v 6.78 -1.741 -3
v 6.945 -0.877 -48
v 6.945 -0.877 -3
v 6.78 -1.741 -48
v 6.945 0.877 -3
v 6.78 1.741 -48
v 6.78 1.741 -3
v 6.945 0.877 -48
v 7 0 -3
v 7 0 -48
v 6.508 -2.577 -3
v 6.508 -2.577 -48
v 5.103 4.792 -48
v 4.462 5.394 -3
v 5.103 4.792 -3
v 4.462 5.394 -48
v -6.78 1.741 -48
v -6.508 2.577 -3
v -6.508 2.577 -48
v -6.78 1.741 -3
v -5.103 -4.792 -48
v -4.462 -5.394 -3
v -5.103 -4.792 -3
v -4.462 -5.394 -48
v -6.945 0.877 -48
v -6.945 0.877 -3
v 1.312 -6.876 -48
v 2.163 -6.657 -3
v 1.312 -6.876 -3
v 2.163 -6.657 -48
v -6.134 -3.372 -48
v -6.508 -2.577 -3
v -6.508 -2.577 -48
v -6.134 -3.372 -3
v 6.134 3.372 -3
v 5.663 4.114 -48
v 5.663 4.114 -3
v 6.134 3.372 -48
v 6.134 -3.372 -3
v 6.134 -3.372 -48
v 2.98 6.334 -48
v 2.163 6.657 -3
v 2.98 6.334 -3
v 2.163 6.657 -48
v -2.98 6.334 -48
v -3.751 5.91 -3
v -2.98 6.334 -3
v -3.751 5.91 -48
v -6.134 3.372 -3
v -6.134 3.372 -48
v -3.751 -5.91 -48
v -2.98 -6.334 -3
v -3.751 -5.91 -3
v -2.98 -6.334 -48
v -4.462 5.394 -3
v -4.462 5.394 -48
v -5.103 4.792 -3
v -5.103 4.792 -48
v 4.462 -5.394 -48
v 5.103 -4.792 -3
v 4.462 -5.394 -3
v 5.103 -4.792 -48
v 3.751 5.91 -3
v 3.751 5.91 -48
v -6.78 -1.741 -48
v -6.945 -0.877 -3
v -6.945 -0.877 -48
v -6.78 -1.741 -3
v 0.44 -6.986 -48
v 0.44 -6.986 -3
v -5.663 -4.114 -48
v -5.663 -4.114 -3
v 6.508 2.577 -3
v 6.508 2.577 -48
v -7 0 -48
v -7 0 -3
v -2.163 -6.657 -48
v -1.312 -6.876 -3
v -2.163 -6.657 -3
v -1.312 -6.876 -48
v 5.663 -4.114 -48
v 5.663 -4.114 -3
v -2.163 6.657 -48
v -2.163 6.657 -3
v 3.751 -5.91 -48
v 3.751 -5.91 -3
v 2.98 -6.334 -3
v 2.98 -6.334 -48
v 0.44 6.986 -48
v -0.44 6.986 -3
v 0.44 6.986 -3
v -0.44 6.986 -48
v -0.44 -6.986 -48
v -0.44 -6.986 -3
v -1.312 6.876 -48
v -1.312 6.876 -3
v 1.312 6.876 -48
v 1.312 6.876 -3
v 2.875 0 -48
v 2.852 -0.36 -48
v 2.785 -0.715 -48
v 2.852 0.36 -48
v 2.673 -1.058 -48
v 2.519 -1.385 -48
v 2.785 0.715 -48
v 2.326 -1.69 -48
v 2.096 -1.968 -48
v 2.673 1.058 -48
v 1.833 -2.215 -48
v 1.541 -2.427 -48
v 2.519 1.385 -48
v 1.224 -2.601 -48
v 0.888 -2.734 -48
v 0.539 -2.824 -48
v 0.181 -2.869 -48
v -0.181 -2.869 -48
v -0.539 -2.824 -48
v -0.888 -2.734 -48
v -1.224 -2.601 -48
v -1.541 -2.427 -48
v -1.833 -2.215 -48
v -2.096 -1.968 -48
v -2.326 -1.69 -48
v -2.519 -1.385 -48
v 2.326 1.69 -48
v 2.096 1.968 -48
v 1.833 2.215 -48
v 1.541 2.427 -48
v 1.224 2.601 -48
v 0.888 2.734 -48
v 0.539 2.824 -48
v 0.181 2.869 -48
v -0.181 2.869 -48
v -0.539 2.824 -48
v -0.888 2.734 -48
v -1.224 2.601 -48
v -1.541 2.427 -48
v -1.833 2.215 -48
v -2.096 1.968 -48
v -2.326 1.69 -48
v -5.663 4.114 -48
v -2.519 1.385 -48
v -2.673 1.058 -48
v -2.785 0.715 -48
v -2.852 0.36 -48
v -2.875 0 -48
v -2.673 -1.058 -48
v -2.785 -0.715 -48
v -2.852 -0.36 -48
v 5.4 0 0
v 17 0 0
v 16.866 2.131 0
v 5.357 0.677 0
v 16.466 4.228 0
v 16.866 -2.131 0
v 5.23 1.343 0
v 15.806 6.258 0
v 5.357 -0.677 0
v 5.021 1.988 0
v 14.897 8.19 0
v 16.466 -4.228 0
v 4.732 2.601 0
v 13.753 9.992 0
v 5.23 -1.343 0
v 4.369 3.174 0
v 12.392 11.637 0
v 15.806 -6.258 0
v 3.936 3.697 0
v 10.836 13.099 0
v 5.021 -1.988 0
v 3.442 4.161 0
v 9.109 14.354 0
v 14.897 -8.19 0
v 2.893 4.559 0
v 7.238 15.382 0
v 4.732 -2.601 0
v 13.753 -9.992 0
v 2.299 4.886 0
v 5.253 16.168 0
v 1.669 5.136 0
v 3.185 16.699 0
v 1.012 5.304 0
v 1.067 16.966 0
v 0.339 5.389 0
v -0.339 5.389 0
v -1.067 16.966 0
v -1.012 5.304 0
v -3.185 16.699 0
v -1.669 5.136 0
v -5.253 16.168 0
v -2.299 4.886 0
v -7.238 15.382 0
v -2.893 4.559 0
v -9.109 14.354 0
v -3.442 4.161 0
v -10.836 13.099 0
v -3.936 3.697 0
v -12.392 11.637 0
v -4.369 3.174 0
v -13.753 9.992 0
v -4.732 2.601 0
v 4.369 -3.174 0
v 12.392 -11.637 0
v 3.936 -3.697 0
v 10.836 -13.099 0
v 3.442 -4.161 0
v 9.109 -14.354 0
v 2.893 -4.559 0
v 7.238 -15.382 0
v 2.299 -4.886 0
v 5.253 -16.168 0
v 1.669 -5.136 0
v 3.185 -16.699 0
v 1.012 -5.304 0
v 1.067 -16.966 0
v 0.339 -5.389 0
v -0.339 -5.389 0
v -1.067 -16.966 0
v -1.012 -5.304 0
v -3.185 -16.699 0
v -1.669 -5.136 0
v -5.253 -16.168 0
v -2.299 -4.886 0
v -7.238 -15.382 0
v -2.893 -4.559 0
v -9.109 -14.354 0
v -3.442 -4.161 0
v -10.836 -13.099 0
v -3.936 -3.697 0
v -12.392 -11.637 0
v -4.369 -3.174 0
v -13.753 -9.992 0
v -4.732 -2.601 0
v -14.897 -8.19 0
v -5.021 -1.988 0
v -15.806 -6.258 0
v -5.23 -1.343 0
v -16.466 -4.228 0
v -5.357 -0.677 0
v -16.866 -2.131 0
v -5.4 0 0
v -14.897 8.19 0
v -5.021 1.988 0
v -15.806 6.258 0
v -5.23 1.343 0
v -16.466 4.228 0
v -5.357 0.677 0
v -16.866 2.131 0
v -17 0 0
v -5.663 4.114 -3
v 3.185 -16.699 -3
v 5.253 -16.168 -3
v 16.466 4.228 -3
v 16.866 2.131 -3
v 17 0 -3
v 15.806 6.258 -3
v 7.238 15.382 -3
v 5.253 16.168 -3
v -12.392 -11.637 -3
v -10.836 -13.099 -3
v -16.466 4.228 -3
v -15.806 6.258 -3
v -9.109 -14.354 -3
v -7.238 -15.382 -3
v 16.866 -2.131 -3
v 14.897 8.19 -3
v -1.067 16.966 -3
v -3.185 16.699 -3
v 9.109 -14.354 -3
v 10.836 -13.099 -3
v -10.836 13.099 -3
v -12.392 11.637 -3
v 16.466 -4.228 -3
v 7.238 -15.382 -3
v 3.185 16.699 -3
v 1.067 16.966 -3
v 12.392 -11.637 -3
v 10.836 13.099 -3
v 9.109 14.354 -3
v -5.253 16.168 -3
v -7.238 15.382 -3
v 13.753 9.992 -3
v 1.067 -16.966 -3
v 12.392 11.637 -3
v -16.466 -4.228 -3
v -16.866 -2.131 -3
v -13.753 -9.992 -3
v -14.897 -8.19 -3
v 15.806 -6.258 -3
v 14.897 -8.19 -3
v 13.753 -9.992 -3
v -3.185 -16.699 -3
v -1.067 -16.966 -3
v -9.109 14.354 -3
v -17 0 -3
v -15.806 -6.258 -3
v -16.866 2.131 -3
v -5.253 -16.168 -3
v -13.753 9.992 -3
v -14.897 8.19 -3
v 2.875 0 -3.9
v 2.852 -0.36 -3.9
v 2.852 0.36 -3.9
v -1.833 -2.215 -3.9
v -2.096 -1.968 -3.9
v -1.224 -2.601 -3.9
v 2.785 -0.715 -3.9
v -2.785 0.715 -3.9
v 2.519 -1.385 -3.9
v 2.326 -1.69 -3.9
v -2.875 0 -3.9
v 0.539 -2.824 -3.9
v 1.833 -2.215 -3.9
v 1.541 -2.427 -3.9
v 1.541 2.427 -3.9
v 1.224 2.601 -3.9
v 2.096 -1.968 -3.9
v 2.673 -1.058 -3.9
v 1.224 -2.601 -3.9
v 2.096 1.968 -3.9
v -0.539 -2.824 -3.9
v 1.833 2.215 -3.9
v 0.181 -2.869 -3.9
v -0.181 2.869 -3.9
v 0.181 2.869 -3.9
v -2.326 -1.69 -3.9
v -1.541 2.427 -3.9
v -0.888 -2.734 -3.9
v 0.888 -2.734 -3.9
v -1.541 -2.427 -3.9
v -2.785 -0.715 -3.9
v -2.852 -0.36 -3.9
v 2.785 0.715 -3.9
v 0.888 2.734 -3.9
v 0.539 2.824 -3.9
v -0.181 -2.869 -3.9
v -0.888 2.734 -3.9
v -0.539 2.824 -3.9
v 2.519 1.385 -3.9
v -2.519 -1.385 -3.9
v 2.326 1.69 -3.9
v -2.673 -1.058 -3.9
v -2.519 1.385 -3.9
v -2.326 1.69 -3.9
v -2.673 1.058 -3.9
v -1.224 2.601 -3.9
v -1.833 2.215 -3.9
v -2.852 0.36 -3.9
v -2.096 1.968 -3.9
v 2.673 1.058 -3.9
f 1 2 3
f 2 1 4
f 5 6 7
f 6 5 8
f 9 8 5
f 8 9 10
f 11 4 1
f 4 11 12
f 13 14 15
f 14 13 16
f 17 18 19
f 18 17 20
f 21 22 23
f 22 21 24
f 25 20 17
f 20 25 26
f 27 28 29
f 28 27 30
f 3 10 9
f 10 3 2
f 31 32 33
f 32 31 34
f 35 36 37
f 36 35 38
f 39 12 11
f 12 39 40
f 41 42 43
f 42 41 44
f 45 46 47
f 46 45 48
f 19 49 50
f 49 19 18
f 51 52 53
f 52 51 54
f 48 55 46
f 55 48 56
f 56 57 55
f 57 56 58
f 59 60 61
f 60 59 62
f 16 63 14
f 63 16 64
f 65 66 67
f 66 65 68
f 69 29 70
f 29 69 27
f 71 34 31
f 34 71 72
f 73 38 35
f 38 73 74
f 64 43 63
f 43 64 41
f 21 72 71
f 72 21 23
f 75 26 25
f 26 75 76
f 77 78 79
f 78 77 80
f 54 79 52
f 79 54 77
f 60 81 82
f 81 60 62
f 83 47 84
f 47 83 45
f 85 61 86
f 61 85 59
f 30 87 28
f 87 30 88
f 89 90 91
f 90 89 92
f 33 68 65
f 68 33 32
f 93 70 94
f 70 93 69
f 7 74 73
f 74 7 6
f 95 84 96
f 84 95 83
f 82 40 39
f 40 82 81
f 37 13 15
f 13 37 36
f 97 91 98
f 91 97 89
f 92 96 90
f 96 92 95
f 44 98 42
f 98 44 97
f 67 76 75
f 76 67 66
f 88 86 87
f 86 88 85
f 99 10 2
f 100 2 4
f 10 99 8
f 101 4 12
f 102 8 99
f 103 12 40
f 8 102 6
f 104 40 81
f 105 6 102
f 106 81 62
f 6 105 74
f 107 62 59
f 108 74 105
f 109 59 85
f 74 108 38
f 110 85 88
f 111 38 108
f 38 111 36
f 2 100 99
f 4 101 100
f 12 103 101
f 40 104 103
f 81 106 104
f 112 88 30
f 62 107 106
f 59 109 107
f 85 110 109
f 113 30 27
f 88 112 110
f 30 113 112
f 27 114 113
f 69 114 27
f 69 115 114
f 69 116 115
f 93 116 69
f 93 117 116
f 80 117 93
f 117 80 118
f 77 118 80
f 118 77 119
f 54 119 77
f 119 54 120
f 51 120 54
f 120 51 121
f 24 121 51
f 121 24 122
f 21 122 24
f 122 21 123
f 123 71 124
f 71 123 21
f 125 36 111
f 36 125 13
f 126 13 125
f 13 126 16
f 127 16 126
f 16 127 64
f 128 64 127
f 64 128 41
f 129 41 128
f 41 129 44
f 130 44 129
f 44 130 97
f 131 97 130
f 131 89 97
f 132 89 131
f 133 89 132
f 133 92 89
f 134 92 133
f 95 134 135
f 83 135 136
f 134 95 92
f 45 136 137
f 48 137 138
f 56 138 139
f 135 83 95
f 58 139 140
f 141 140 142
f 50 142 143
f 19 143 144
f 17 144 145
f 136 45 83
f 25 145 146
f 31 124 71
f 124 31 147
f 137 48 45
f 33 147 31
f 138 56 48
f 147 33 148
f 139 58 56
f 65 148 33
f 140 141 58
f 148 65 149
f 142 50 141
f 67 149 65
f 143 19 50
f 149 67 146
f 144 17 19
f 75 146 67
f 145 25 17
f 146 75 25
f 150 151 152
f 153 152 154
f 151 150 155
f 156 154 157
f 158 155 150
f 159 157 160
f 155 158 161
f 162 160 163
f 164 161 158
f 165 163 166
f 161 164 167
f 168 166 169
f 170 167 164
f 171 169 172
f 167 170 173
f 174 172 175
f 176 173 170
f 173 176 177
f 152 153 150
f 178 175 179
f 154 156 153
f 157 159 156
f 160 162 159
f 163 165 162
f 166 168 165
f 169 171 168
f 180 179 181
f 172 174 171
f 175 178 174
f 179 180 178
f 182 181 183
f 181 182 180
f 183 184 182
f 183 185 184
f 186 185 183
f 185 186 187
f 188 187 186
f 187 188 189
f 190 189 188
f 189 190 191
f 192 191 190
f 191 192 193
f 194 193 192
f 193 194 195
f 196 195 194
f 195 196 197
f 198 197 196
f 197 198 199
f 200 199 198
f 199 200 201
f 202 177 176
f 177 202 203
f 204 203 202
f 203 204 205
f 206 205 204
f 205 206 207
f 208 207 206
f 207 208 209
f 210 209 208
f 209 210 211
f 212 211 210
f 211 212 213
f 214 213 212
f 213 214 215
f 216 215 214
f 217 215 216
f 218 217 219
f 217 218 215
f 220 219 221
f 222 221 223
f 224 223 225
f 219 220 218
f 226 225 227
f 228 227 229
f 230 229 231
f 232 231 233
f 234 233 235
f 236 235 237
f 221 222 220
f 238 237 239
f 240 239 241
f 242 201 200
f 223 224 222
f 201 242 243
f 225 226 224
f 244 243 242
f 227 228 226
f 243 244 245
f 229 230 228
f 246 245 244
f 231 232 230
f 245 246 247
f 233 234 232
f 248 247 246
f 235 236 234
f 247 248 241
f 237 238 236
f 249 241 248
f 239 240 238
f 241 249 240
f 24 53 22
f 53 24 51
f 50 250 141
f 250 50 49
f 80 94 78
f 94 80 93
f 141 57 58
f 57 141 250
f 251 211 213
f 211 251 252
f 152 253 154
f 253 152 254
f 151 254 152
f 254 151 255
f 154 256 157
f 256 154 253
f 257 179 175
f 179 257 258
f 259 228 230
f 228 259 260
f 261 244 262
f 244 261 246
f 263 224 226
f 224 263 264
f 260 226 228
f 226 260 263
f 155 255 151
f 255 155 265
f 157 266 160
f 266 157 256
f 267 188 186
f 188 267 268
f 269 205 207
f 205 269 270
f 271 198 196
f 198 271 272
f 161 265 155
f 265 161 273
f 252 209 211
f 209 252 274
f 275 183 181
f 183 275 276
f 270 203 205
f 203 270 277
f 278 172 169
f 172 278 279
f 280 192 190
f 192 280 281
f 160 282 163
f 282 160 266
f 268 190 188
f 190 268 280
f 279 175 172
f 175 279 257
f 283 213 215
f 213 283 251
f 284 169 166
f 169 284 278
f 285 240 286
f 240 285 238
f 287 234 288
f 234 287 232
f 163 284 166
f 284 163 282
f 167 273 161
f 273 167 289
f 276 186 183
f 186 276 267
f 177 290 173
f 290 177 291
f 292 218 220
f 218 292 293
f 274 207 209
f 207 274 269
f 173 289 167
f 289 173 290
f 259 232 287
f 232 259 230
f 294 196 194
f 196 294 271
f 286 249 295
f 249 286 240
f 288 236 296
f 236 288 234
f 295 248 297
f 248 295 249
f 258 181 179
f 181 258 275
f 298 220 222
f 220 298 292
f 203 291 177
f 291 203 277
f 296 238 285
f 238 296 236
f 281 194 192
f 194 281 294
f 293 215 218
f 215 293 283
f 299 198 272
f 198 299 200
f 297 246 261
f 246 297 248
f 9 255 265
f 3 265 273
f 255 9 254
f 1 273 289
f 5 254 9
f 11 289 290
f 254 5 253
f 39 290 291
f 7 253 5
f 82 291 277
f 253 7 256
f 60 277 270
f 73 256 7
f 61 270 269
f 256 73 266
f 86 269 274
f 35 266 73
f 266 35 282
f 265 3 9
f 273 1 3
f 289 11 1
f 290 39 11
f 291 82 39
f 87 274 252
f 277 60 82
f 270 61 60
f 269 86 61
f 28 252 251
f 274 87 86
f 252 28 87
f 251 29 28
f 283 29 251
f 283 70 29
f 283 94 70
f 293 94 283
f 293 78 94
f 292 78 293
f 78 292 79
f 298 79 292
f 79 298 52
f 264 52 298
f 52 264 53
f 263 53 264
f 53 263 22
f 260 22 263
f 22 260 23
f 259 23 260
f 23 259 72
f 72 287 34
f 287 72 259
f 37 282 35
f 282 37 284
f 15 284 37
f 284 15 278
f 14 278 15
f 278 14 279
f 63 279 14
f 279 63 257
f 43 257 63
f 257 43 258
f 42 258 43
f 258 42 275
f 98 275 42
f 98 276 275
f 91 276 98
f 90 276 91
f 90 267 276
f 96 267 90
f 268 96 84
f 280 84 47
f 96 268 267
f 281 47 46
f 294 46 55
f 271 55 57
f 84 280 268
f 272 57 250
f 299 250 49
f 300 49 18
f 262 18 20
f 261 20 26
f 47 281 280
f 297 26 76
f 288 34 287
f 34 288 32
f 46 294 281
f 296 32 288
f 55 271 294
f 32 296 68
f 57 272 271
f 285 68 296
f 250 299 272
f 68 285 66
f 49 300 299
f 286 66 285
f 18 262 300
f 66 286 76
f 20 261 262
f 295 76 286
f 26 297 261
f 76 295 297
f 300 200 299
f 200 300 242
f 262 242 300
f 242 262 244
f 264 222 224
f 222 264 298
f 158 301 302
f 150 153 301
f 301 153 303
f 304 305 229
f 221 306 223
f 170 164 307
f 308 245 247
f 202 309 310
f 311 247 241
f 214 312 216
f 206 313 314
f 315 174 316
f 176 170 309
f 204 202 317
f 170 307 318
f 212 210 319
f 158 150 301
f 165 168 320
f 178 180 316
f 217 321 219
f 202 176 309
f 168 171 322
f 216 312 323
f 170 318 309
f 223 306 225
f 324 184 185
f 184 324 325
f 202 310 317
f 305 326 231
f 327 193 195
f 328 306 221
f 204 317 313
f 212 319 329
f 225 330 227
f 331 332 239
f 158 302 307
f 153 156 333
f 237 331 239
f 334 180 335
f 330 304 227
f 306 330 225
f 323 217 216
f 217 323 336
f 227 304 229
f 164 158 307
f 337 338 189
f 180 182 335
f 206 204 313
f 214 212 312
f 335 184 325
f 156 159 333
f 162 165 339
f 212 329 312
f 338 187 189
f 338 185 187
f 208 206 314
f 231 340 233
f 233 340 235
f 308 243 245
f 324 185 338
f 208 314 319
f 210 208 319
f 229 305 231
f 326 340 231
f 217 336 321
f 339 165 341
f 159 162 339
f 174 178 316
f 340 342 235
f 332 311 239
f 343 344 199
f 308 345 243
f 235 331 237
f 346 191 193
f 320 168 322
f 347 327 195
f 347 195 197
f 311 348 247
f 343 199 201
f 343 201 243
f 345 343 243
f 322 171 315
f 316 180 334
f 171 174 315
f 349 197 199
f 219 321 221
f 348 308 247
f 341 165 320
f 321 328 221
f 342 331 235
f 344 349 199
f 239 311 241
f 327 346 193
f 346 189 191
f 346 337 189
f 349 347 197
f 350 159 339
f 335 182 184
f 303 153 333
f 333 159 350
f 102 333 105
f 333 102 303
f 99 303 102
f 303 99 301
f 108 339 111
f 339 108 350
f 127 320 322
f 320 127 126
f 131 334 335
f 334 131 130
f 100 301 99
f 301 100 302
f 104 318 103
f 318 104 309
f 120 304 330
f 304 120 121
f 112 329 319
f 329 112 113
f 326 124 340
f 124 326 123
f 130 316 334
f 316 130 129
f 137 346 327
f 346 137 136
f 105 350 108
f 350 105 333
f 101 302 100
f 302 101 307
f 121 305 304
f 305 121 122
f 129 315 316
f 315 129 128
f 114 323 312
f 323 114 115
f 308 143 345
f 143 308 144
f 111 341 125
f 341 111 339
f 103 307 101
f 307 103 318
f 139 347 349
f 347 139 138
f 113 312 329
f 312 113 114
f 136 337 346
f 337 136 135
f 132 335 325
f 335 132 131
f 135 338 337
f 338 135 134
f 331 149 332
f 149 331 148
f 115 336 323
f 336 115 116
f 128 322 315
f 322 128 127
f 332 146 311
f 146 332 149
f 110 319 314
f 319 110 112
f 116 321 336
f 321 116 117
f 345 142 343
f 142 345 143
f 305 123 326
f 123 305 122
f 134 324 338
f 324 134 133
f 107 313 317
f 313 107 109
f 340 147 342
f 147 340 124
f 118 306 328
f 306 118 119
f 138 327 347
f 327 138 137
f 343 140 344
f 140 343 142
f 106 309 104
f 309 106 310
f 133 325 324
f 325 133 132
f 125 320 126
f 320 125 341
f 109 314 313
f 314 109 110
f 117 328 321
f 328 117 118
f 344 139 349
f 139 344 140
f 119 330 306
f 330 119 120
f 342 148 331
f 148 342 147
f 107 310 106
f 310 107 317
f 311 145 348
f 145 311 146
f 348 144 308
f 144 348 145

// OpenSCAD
$fn = 50;


difference() {
	union() {
		translate(v = [0, 0, -48.0000000000]) {
			cylinder(h = 48, r = 7.0000000000);
		}
		translate(v = [0, 0, -3.0000000000]) {
			cylinder(h = 3, r = 17.0000000000);
		}
	}
	union() {
		translate(v = [0, 0, 0]) {
			rotate(a = [0, 0, 0]) {
				difference() {
					union() {
						#translate(v = [0, 0, -48.0000000000]) {
							cylinder(h = 48, r = 2.6000000000);
						}
						#translate(v = [0, 0, -3.9000000000]) {
							cylinder(h = 3.9000000000, r1 = 2.8750000000, r2 = 5.4000000000);
						}
						#translate(v = [0, 0, -48.0000000000]) {
							cylinder(h = 48, r = 2.8750000000);
						}
						#translate(v = [0, 0, -48.0000000000]) {
							cylinder(h = 48, r = 2.6000000000);
						}
					}
					union();
				}
			}
		}
	}
}
